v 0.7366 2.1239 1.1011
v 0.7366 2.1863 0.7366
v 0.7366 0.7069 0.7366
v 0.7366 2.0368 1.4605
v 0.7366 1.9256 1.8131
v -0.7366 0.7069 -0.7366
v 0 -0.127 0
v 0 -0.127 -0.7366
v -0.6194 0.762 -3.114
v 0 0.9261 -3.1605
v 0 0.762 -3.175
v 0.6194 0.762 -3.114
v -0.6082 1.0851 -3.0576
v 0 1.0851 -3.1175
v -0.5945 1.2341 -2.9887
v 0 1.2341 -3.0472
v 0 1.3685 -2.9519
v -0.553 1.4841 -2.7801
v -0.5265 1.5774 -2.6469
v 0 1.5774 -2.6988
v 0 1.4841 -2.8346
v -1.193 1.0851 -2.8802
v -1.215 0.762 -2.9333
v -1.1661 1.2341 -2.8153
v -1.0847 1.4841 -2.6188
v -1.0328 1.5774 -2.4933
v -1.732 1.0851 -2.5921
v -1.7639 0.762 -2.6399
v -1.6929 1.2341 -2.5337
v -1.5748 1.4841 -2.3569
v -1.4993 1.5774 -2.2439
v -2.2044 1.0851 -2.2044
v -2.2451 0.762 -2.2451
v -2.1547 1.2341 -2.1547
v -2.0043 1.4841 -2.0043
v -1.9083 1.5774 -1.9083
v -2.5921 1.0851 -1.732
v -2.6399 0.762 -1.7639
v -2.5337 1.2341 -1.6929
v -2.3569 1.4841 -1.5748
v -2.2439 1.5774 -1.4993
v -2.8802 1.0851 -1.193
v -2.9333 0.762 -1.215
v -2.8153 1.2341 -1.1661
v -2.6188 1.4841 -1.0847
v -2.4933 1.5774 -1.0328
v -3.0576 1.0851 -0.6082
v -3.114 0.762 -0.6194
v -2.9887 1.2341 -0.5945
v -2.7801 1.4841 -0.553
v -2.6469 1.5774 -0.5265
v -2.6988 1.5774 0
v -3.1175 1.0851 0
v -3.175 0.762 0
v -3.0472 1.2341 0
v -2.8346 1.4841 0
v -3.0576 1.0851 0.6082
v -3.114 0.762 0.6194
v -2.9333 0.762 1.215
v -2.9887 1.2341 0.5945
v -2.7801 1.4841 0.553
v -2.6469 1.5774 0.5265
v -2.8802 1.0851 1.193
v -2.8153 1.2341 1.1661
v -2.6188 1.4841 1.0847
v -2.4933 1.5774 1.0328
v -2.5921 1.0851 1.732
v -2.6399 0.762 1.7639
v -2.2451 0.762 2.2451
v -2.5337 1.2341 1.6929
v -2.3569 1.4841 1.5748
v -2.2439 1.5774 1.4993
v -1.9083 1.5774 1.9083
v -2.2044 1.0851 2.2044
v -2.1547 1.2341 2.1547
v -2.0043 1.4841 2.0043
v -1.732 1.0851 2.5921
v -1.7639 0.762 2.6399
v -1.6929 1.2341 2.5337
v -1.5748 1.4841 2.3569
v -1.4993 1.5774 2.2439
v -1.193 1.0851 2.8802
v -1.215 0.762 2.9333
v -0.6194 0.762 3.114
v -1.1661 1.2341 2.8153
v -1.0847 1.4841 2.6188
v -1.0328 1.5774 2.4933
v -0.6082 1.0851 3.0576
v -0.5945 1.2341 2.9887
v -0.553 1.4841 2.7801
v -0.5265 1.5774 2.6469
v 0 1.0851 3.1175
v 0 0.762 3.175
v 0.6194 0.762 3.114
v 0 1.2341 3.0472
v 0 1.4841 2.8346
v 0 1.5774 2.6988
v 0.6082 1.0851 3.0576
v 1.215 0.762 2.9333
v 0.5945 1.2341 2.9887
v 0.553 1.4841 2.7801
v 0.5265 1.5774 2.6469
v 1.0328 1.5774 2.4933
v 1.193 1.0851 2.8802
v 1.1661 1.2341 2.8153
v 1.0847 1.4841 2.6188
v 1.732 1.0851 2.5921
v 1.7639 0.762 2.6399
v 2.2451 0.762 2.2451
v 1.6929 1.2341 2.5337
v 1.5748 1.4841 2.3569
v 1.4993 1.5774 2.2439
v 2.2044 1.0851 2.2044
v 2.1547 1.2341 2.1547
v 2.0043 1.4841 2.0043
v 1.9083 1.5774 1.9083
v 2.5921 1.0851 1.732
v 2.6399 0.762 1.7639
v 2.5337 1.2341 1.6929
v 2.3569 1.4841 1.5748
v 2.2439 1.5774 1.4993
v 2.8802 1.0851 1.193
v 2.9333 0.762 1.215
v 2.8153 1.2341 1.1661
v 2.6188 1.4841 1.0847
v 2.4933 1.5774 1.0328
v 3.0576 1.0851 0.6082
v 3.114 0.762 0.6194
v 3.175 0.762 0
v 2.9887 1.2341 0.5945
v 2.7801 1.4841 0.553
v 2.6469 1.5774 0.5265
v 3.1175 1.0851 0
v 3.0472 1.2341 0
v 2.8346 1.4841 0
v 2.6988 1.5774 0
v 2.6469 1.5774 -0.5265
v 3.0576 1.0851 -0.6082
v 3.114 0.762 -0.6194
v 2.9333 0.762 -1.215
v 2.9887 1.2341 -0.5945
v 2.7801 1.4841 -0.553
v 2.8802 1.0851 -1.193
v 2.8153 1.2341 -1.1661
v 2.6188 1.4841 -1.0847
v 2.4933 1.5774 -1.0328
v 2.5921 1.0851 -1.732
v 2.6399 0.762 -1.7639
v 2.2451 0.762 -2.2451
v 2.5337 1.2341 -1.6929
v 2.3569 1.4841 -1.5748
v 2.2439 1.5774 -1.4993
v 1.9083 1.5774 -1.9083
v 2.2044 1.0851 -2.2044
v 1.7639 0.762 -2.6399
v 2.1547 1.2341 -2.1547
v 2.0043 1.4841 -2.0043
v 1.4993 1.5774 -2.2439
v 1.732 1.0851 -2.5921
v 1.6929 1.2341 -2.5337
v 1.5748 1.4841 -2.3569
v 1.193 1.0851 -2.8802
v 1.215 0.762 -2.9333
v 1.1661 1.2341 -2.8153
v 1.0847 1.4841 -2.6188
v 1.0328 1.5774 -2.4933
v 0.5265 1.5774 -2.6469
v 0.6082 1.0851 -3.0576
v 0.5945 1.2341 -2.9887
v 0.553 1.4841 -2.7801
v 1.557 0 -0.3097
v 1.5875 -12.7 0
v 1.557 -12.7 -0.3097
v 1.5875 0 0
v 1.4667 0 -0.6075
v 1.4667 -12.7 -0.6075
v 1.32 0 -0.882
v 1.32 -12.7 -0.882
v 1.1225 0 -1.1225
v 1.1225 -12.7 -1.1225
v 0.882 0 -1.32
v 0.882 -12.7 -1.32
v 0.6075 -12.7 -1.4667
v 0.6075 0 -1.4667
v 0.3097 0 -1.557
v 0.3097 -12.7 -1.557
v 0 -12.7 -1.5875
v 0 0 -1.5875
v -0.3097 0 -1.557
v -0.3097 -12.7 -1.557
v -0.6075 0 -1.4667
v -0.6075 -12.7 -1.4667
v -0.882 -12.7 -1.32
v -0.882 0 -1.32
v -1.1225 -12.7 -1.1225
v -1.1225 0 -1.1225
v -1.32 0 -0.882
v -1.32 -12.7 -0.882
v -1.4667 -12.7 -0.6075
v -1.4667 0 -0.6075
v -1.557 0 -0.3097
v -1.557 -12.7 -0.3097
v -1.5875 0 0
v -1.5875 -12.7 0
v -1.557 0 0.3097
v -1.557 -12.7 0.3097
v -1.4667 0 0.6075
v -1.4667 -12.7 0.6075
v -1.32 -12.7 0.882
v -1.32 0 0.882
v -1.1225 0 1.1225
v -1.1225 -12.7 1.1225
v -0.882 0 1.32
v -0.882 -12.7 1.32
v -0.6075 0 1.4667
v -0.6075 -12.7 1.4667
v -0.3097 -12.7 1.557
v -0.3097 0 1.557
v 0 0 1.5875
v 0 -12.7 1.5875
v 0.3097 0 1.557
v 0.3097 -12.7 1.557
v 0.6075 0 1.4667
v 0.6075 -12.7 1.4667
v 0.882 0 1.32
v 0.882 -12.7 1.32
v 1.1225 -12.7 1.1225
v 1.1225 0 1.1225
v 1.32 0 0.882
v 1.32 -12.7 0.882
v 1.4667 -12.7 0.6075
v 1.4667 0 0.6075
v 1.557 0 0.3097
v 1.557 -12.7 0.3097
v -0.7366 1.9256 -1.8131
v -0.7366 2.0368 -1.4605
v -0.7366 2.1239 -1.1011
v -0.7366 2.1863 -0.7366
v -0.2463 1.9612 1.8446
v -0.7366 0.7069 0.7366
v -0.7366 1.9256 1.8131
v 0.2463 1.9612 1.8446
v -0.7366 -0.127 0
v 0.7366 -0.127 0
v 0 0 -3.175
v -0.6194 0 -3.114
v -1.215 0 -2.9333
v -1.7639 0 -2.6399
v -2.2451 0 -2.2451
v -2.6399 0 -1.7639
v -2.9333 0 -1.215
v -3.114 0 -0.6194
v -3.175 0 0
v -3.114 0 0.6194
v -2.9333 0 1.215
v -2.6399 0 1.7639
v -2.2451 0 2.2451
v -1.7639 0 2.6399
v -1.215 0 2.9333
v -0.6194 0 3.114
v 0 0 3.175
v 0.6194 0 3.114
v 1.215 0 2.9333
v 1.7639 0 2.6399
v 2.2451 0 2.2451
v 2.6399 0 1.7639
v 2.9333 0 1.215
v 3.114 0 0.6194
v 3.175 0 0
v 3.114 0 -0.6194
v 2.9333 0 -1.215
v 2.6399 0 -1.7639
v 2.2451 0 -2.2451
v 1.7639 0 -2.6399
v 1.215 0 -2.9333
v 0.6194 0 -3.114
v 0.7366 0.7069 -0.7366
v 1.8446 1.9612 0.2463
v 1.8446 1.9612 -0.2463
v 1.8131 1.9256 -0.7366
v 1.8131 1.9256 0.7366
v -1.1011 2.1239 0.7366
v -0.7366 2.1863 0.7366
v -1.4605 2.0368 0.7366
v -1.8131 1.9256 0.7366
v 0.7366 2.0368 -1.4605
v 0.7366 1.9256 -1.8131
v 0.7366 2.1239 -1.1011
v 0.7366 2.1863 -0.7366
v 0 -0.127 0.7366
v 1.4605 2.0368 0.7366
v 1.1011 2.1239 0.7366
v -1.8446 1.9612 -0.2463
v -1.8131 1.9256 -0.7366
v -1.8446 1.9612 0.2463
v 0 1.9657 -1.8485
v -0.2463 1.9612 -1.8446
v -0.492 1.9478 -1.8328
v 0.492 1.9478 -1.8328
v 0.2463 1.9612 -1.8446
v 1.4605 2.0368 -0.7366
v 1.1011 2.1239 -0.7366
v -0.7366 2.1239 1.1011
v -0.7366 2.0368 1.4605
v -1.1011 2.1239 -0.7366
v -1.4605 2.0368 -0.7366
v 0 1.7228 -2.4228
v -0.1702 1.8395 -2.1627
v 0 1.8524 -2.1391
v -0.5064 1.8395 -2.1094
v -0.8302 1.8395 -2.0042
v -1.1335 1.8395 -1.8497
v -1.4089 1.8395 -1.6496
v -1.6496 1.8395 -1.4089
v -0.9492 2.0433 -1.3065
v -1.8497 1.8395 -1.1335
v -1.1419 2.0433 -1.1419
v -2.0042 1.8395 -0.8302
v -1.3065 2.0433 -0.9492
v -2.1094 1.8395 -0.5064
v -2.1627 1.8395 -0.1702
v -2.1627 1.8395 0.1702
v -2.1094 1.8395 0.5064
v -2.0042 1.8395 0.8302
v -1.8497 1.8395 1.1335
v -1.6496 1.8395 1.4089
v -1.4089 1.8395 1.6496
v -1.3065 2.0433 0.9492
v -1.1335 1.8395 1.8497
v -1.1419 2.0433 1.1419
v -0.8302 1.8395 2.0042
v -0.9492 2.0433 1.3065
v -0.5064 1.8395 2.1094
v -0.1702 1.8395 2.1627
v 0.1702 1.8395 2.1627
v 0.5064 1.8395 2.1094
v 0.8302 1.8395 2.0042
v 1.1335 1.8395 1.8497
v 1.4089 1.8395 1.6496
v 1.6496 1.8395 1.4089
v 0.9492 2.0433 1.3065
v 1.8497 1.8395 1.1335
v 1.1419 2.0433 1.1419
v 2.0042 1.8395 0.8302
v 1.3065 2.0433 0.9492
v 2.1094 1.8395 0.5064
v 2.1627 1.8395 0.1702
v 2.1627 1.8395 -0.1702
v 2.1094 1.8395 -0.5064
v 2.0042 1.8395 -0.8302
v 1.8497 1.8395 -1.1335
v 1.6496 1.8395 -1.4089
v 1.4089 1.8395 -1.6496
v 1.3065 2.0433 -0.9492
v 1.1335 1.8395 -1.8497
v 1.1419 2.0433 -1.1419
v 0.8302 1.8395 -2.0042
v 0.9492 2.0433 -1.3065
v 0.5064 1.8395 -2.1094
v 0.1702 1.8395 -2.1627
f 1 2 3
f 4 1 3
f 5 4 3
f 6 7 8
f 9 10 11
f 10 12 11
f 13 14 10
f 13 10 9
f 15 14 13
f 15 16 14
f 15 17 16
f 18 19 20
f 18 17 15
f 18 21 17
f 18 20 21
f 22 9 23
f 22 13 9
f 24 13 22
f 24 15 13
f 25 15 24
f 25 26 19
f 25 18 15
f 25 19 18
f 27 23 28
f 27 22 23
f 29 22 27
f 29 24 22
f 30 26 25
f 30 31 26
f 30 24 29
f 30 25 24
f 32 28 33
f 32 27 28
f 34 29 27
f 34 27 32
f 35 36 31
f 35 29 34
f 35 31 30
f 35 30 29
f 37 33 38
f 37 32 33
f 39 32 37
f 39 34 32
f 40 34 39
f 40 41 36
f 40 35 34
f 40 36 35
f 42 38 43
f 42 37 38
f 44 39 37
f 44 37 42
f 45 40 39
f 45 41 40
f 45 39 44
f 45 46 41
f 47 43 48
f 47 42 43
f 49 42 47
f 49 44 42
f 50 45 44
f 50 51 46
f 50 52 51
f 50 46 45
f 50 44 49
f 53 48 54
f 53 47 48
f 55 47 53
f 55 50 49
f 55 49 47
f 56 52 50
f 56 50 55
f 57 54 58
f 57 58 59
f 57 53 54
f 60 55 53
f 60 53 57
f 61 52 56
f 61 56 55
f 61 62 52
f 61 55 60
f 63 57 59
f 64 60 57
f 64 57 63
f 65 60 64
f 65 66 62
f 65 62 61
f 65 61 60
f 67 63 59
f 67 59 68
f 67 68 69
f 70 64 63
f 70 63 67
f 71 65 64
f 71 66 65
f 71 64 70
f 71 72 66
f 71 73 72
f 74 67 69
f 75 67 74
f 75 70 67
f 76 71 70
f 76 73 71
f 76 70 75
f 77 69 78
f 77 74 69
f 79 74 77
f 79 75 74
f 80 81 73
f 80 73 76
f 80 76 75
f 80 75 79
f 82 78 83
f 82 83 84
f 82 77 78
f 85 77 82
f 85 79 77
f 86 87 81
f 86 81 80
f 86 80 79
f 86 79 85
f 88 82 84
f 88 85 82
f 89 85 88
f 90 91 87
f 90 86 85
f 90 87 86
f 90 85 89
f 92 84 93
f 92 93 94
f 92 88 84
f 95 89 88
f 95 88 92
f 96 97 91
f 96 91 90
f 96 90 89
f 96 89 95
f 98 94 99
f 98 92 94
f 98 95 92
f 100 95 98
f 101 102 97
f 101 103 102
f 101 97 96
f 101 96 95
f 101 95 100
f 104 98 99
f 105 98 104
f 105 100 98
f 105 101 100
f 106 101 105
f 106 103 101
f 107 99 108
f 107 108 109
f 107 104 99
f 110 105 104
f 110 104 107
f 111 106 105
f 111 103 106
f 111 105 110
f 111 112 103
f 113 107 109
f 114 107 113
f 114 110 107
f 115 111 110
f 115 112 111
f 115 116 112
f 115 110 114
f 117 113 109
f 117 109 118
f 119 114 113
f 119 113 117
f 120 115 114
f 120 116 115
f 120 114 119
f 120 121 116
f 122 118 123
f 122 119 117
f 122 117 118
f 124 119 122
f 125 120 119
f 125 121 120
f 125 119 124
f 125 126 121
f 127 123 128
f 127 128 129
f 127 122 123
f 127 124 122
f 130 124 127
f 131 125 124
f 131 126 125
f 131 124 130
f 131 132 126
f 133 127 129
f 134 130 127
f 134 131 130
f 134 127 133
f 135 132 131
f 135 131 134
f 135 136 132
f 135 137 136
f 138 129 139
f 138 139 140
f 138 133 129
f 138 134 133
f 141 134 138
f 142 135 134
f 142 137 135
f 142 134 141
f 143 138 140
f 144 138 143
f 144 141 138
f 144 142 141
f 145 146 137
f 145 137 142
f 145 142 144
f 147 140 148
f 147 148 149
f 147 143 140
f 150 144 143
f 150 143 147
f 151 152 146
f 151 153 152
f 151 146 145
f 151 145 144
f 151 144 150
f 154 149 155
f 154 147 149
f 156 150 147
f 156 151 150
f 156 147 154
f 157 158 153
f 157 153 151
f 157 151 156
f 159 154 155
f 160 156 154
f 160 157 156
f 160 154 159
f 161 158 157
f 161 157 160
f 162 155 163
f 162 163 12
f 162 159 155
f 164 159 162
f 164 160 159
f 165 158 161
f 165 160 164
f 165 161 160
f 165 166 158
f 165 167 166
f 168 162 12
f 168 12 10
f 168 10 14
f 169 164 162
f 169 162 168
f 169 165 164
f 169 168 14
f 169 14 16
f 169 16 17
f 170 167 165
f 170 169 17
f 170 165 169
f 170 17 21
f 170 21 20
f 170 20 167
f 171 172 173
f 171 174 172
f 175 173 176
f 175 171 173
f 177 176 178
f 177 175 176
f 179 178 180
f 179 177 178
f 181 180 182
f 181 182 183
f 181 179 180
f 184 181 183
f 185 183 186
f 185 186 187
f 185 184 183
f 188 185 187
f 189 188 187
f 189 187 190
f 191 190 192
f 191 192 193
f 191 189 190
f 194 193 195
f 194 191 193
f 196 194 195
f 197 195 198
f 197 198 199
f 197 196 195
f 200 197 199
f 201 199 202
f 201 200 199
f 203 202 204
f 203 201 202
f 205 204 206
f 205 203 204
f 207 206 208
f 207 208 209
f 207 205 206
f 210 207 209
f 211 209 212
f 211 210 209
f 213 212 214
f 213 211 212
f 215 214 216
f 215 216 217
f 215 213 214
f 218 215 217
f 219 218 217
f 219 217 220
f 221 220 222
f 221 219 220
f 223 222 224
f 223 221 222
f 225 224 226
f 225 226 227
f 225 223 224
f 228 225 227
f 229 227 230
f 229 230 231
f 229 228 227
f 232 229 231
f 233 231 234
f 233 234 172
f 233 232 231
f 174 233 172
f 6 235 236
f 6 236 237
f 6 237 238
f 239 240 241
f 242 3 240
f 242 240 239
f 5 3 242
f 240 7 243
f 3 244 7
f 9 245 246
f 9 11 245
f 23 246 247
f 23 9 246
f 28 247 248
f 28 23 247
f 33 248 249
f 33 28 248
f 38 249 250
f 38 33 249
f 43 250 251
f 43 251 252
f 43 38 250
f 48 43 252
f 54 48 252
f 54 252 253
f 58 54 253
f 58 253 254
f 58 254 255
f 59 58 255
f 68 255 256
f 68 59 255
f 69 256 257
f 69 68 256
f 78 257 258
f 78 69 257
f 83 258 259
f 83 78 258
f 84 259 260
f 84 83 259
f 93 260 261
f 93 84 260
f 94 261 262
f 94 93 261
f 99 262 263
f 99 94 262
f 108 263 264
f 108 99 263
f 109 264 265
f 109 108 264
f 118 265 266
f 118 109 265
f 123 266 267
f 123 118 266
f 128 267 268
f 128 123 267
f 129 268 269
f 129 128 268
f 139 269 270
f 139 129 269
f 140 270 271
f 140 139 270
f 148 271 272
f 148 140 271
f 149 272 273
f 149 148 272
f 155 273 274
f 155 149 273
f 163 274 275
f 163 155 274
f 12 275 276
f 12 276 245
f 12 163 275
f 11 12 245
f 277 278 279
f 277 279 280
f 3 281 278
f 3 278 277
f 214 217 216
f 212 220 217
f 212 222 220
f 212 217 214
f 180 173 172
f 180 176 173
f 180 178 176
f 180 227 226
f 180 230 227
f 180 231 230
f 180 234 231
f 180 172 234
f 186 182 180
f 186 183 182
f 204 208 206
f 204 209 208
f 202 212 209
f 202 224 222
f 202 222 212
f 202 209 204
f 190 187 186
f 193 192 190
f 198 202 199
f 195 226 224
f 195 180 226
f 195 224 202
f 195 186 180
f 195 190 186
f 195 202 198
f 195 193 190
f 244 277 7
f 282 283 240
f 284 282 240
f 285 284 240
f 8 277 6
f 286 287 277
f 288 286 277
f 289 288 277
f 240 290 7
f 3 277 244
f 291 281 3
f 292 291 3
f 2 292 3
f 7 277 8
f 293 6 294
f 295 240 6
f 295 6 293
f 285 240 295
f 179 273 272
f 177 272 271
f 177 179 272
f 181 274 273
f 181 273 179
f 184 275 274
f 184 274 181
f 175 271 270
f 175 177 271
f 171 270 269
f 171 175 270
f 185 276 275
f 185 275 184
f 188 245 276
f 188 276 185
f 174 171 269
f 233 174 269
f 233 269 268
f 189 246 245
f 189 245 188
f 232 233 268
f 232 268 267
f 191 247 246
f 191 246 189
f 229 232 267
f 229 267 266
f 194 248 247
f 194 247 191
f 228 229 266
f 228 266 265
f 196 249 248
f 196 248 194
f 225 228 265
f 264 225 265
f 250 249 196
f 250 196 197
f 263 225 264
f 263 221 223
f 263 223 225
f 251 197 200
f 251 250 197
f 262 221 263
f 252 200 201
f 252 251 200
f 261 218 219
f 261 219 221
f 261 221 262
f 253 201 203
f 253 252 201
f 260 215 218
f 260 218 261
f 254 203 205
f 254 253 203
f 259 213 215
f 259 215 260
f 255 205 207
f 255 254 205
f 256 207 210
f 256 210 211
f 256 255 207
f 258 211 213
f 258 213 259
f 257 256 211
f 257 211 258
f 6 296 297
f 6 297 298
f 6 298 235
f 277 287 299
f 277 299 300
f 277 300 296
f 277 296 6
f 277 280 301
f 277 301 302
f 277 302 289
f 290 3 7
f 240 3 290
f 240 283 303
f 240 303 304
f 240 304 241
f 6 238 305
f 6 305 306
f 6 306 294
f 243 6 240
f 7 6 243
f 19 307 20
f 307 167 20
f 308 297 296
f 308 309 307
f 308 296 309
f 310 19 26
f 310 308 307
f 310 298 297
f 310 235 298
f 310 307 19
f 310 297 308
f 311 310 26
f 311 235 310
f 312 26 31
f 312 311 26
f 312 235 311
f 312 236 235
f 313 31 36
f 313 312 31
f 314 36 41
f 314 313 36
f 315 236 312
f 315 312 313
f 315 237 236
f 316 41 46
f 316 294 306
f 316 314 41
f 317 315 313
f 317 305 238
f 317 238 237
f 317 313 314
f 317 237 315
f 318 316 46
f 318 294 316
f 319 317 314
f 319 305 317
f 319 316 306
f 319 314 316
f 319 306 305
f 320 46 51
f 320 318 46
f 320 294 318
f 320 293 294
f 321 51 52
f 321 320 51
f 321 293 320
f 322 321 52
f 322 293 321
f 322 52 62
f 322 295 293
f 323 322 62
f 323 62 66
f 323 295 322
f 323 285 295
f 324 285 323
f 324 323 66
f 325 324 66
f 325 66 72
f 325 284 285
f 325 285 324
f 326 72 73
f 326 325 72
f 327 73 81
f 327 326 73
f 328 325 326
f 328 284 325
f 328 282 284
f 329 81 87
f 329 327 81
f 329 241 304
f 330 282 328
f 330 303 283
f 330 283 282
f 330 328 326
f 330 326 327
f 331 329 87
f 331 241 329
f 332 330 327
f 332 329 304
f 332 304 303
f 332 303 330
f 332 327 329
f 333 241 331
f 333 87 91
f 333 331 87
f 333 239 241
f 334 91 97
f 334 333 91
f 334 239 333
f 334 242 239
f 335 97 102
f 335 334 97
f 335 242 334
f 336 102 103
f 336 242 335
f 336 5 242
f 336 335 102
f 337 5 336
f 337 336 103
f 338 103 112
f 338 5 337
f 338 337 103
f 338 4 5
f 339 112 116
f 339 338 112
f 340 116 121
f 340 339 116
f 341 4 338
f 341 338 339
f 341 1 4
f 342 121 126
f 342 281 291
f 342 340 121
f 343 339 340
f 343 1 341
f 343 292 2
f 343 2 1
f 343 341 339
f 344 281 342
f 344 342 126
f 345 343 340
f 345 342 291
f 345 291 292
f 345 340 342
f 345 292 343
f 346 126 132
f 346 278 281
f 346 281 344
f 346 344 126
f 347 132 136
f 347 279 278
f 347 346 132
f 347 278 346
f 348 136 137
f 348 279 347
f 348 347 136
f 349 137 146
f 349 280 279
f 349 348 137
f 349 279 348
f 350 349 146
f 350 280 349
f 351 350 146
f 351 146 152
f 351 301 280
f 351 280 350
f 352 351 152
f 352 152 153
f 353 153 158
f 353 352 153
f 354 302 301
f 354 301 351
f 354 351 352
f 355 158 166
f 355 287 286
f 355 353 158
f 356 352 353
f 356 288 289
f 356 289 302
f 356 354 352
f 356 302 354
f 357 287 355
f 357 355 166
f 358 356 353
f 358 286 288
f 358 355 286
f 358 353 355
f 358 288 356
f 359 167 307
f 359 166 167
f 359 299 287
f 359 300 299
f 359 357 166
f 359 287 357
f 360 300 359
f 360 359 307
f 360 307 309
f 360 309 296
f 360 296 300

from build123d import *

# Parameters (mm, degrees)
SKETCH2_W          = 1.5875
SKETCH2_H          = 12.7
CUT_EXTRUDE1_DEPTH = 0.736599362
CUT_EXTRUDE2_DEPTH = 0.736599362


with BuildPart() as part:
    # Sketch1 → Base-Revolve (revolve)
    with BuildSketch(Plane.XY, mode=Mode.PRIVATE) as base_revolve_sk:
        with BuildLine():
            Line((0, 0), (3.175, 0))
            Line((3.175, 0), (3.175, 0.762))
            ThreePointArc((3.175, 0.762), (3.047218091, 1.234139911), (2.698756382, 1.577387268))
            ThreePointArc((2.698756382, 1.577387268), (1.395118097, 2.105894374), (0, 2.286))
            Line((0, 2.286), (0, 0))
        make_face()
    revolve(base_revolve_sk.sketch.rotate(Axis((0, 0, 0), (0, 1, 0)), 90), axis=Axis((0, 0, 0), (0, 1, 0)))

    # Sketch2 → Boss-Revolve1 (revolve)
    with BuildSketch(Plane.XY):
        with Locations((0.79375, -6.35)):
            Rectangle(SKETCH2_W, SKETCH2_H)
    revolve(axis=Axis((0, 0, 0), (0, 1, 0)))

    # Sketch3 → Cut-Extrude1 (cut, symmetric)
    with BuildSketch(Plane.XY):
        Polygon((-4.038596502, 6.667494225), (4.038596502, 6.667494225), (4.038596502, 4.44499615), (0, -0.12699989), (-4.038596502, 4.44499615), align=None)
    extrude(amount=CUT_EXTRUDE1_DEPTH, both=True, mode=Mode.SUBTRACT)

    # Sketch4 → Cut-Extrude2 (cut, symmetric)
    with BuildSketch(Plane(origin=(0, 0, 0), x_dir=(0, 0, -1), z_dir=(1, 0, 0))):
        Polygon((-4.038596502, 6.667494225), (4.038596502, 6.667494225), (4.038596502, 4.44499615), (0, -0.12699989), (-4.038596502, 4.44499615), align=None)
    extrude(amount=CUT_EXTRUDE2_DEPTH, both=True, mode=Mode.SUBTRACT)


solid = part.part
